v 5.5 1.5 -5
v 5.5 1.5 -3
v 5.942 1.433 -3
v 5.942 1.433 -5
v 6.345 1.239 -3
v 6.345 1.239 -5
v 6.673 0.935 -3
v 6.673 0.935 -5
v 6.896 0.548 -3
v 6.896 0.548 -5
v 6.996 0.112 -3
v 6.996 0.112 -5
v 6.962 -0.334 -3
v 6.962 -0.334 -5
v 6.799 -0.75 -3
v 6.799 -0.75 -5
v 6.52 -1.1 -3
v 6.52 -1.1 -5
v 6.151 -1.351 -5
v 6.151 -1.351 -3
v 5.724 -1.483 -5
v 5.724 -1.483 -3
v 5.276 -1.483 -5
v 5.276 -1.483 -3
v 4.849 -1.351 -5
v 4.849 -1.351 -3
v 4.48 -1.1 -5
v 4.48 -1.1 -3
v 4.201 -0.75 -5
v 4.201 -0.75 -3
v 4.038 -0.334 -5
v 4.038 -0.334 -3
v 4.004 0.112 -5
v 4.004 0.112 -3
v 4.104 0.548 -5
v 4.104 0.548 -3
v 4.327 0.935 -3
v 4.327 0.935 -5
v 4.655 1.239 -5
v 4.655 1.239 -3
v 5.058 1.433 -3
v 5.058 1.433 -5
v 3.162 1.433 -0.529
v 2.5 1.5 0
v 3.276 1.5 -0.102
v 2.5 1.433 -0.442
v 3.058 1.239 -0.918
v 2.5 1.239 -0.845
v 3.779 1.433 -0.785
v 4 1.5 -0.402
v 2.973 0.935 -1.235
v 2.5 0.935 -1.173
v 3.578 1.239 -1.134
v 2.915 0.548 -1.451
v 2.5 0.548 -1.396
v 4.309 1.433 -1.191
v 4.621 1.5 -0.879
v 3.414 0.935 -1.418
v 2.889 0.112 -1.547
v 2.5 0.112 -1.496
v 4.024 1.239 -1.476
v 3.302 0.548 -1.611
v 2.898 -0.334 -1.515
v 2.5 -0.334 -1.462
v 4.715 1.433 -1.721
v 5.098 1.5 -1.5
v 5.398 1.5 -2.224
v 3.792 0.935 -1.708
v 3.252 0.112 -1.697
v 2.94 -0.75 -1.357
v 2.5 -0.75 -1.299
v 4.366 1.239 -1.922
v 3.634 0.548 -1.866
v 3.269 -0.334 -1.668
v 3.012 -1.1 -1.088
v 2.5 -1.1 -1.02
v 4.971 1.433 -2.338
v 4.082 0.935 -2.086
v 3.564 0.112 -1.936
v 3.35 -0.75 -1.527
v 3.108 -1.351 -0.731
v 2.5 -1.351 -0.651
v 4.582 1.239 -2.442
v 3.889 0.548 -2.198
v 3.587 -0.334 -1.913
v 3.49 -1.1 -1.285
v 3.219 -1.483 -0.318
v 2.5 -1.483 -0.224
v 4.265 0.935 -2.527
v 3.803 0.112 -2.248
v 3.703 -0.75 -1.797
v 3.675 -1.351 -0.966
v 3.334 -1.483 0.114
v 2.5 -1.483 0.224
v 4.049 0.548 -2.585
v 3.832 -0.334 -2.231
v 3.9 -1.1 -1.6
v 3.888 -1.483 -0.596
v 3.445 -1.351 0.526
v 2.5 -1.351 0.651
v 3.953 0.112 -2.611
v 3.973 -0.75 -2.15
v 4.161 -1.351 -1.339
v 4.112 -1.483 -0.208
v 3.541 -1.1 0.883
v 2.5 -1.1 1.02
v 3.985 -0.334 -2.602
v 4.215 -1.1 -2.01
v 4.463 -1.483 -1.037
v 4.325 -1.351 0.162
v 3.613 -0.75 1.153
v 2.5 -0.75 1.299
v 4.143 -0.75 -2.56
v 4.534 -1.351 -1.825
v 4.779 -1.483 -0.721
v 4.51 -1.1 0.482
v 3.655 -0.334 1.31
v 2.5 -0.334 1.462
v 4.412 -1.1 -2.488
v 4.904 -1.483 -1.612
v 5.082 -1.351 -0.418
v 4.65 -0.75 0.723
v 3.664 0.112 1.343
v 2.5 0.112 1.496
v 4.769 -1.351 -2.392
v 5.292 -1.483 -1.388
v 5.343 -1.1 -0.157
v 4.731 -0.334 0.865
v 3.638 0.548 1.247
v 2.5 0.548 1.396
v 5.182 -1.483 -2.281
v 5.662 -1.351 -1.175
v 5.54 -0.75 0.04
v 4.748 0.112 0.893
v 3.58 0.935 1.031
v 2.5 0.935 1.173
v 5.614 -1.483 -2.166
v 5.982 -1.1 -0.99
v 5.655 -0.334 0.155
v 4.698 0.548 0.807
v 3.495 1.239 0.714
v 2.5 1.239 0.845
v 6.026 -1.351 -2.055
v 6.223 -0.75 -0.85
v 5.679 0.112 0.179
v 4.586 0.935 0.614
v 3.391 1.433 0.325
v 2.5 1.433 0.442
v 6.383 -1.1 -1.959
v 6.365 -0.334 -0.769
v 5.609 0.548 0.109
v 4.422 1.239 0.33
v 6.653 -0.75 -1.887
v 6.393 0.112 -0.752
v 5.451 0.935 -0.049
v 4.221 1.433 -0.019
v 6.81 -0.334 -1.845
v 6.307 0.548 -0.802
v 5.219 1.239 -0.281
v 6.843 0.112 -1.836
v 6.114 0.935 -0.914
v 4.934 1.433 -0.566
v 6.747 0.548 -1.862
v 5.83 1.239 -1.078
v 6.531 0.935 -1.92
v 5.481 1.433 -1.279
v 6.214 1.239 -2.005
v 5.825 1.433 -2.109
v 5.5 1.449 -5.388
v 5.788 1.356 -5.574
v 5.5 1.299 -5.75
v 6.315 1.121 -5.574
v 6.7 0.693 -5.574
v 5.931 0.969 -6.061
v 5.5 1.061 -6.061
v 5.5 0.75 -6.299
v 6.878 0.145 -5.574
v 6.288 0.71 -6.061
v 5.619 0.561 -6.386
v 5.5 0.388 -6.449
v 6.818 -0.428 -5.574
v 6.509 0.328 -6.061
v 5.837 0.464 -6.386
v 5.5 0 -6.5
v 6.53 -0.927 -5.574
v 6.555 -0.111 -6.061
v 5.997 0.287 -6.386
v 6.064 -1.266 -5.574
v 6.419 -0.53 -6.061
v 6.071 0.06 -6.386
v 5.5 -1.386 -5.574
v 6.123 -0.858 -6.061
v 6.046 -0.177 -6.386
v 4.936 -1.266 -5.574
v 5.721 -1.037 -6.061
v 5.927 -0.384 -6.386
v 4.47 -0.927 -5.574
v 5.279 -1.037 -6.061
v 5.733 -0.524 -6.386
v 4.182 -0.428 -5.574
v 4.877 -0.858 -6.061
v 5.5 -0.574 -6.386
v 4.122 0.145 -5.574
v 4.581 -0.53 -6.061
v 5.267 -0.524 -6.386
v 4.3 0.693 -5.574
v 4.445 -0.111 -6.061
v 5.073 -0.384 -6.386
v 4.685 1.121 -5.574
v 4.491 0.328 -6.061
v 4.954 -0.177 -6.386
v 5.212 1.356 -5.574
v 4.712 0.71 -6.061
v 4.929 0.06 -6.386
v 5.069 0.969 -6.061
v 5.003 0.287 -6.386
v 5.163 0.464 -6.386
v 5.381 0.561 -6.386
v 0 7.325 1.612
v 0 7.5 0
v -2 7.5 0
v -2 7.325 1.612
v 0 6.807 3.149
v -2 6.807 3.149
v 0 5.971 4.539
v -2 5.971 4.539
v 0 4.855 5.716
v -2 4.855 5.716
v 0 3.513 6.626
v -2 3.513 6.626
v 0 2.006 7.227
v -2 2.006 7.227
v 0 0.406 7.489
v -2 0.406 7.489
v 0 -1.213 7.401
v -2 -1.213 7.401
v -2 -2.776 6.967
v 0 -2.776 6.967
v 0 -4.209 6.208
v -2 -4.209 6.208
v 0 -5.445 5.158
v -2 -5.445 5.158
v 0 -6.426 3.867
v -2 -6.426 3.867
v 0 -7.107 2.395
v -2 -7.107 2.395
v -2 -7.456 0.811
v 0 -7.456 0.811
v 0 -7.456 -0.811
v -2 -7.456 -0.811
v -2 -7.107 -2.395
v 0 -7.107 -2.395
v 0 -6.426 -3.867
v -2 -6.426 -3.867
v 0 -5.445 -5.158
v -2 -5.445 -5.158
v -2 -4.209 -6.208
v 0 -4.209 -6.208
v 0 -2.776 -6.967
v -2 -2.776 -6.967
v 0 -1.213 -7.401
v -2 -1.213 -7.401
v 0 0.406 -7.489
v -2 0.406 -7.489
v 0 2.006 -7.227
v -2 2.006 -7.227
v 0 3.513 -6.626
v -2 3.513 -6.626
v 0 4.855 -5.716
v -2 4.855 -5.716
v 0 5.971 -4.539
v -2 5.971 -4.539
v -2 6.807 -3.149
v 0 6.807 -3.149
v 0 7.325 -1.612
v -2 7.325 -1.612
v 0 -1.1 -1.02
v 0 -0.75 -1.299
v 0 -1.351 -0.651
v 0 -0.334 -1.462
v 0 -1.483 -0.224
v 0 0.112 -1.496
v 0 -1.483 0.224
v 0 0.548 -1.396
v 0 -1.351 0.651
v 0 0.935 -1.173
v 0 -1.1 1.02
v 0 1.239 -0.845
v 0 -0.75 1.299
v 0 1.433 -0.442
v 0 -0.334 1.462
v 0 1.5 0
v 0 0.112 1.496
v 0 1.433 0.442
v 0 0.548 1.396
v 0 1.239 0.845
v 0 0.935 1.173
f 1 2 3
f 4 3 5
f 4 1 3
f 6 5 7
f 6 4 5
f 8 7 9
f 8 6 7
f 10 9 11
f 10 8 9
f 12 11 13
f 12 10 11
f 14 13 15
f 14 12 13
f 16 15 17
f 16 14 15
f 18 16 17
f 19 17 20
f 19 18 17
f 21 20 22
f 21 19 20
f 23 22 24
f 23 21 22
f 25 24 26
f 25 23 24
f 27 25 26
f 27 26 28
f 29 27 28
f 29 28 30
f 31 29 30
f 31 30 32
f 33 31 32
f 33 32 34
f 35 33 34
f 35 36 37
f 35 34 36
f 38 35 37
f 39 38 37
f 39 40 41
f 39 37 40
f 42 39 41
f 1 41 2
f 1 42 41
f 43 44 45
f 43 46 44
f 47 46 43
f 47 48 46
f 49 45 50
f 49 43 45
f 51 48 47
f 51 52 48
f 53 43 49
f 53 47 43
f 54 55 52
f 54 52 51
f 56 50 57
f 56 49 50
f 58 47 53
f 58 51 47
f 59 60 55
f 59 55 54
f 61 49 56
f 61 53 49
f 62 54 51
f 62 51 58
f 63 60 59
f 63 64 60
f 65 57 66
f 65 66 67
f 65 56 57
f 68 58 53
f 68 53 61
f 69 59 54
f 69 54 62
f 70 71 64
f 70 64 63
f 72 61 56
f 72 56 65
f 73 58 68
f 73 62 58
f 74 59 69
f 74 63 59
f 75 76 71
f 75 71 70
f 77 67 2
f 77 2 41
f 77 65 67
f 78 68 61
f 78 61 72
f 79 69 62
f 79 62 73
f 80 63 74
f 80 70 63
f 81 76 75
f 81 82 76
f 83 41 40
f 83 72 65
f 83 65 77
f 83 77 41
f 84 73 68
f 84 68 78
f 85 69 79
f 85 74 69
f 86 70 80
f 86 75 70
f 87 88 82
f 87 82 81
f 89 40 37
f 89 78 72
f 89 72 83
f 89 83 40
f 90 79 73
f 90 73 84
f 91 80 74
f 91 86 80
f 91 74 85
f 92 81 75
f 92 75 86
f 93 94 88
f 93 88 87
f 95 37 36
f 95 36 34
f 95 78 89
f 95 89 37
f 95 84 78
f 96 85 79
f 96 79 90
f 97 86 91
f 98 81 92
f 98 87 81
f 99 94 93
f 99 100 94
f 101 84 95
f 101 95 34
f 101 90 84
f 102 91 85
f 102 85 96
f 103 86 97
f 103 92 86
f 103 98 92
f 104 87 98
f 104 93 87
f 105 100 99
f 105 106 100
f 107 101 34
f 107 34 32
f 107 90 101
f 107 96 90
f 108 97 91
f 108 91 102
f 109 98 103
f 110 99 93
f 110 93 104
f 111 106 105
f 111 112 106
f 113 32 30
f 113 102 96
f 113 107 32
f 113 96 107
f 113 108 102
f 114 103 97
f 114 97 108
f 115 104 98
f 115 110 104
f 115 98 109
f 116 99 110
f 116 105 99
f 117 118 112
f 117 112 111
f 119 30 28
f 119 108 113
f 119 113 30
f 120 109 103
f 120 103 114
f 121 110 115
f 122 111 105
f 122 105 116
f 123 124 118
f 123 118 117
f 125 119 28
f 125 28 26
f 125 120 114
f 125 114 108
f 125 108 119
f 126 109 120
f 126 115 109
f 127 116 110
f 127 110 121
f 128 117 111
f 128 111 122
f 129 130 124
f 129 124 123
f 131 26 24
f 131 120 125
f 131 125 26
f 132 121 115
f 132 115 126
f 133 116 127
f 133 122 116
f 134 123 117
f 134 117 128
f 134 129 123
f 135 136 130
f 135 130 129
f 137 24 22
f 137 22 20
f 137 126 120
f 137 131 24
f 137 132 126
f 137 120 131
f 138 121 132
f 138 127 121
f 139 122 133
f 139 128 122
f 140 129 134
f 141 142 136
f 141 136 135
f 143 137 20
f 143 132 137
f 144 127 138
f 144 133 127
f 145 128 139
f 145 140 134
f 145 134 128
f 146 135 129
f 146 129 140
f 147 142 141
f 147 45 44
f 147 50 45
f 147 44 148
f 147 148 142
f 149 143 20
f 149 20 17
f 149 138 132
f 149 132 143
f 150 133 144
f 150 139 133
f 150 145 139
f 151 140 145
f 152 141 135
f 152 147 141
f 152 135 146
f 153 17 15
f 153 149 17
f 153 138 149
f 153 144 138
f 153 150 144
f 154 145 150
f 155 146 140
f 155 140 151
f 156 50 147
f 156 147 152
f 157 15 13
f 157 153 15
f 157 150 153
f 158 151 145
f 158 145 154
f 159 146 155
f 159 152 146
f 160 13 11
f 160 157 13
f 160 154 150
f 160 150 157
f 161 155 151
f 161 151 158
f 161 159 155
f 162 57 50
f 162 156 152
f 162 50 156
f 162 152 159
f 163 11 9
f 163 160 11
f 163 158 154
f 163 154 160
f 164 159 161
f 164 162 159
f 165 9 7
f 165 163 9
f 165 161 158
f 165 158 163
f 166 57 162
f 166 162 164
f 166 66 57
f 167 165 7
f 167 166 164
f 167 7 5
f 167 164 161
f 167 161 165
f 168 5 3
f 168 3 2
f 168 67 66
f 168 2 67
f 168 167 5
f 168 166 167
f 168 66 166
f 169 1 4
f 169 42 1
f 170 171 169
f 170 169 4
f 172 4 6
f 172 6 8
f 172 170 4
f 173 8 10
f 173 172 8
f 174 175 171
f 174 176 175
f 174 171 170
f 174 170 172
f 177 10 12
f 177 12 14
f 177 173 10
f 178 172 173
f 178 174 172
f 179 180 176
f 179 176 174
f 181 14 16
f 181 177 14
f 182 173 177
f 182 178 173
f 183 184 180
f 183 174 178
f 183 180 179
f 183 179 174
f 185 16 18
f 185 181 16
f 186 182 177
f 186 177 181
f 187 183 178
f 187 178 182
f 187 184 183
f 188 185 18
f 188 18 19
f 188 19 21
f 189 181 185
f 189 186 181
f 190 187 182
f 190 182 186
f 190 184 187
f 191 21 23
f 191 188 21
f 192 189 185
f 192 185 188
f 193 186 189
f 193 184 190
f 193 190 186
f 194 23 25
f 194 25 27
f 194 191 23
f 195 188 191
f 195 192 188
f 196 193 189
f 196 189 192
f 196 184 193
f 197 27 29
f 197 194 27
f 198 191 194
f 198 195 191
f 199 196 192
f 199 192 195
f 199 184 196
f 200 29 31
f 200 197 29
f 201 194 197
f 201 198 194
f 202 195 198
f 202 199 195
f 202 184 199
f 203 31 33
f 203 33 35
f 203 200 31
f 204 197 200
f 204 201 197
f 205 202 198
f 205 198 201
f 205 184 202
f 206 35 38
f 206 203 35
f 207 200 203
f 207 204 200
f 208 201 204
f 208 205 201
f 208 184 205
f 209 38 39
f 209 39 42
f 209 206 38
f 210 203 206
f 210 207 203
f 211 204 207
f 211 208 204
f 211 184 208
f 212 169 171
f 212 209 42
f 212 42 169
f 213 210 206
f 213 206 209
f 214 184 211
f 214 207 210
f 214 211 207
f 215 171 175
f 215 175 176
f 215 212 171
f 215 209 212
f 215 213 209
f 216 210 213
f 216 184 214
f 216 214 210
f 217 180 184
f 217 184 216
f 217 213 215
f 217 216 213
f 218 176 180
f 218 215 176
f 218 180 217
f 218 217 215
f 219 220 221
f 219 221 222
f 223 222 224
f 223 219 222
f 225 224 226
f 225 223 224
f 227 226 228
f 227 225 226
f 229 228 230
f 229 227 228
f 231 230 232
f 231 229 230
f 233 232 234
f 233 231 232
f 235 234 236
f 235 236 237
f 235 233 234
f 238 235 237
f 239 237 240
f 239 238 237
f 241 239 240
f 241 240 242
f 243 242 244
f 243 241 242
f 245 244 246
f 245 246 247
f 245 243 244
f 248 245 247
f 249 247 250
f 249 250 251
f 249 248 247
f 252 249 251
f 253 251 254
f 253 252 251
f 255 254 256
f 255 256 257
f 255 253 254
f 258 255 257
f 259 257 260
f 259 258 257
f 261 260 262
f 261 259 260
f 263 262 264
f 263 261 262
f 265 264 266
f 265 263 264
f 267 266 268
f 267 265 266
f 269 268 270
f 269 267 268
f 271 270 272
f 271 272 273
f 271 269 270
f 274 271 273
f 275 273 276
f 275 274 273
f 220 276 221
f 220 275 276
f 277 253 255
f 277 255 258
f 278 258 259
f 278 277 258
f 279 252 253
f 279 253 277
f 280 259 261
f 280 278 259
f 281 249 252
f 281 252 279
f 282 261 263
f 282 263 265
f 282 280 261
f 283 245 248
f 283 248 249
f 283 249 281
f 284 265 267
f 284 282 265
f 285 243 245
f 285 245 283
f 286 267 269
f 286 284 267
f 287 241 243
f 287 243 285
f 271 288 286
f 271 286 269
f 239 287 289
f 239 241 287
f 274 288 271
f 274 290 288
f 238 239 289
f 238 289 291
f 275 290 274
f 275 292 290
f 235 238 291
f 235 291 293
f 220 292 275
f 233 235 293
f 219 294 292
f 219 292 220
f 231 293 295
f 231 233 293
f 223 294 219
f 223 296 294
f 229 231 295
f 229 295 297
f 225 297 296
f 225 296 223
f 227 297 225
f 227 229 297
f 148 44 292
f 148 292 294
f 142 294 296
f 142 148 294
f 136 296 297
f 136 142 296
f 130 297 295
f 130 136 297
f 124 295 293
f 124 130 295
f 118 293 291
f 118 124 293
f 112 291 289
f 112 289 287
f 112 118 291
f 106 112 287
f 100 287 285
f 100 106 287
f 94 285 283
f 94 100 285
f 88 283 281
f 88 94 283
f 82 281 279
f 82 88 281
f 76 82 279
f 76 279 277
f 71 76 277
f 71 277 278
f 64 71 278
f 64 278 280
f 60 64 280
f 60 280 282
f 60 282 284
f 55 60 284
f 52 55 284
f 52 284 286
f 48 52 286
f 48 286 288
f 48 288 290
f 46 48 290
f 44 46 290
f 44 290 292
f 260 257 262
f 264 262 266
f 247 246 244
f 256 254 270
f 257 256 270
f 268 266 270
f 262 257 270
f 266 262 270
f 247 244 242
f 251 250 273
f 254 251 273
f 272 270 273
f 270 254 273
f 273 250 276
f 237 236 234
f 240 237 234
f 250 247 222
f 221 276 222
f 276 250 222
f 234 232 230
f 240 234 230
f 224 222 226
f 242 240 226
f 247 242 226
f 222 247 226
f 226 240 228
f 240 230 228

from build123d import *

# Parameters (mm, degrees)
F0_R     = 7.5
F1_DEPTH = 2
F3_R     = 1.5
F5_R     = 1.5


with BuildPart() as f1:
    # F0 (on Right) → F1 (new body)
    with BuildSketch(Plane.YZ):
        Circle(F0_R)
    extrude(amount=-F1_DEPTH)

    # F4: sweep along a path in F2
    with BuildLine(Plane.XZ) as f4_path:
        Line((0, 0), (2.5, 0))
        ThreePointArc((2.5, 0), (4.6213203436, -0.8786796564), (5.5, -3))
        Line((5.5, -3), (5.5, -6.5))
    # F3 (on Right) → F4 (sweep)
    with BuildSketch(Plane.YZ):
        Circle(F3_R)
    sweep(path=f4_path.line)

    # F5
    f5_edges = [f1.edges().sort_by_distance(p)[0] for p in [
        (5.5, -1.5, -6.5),
    ]]
    fillet(f5_edges, radius=F5_R)


solid = f1.part
